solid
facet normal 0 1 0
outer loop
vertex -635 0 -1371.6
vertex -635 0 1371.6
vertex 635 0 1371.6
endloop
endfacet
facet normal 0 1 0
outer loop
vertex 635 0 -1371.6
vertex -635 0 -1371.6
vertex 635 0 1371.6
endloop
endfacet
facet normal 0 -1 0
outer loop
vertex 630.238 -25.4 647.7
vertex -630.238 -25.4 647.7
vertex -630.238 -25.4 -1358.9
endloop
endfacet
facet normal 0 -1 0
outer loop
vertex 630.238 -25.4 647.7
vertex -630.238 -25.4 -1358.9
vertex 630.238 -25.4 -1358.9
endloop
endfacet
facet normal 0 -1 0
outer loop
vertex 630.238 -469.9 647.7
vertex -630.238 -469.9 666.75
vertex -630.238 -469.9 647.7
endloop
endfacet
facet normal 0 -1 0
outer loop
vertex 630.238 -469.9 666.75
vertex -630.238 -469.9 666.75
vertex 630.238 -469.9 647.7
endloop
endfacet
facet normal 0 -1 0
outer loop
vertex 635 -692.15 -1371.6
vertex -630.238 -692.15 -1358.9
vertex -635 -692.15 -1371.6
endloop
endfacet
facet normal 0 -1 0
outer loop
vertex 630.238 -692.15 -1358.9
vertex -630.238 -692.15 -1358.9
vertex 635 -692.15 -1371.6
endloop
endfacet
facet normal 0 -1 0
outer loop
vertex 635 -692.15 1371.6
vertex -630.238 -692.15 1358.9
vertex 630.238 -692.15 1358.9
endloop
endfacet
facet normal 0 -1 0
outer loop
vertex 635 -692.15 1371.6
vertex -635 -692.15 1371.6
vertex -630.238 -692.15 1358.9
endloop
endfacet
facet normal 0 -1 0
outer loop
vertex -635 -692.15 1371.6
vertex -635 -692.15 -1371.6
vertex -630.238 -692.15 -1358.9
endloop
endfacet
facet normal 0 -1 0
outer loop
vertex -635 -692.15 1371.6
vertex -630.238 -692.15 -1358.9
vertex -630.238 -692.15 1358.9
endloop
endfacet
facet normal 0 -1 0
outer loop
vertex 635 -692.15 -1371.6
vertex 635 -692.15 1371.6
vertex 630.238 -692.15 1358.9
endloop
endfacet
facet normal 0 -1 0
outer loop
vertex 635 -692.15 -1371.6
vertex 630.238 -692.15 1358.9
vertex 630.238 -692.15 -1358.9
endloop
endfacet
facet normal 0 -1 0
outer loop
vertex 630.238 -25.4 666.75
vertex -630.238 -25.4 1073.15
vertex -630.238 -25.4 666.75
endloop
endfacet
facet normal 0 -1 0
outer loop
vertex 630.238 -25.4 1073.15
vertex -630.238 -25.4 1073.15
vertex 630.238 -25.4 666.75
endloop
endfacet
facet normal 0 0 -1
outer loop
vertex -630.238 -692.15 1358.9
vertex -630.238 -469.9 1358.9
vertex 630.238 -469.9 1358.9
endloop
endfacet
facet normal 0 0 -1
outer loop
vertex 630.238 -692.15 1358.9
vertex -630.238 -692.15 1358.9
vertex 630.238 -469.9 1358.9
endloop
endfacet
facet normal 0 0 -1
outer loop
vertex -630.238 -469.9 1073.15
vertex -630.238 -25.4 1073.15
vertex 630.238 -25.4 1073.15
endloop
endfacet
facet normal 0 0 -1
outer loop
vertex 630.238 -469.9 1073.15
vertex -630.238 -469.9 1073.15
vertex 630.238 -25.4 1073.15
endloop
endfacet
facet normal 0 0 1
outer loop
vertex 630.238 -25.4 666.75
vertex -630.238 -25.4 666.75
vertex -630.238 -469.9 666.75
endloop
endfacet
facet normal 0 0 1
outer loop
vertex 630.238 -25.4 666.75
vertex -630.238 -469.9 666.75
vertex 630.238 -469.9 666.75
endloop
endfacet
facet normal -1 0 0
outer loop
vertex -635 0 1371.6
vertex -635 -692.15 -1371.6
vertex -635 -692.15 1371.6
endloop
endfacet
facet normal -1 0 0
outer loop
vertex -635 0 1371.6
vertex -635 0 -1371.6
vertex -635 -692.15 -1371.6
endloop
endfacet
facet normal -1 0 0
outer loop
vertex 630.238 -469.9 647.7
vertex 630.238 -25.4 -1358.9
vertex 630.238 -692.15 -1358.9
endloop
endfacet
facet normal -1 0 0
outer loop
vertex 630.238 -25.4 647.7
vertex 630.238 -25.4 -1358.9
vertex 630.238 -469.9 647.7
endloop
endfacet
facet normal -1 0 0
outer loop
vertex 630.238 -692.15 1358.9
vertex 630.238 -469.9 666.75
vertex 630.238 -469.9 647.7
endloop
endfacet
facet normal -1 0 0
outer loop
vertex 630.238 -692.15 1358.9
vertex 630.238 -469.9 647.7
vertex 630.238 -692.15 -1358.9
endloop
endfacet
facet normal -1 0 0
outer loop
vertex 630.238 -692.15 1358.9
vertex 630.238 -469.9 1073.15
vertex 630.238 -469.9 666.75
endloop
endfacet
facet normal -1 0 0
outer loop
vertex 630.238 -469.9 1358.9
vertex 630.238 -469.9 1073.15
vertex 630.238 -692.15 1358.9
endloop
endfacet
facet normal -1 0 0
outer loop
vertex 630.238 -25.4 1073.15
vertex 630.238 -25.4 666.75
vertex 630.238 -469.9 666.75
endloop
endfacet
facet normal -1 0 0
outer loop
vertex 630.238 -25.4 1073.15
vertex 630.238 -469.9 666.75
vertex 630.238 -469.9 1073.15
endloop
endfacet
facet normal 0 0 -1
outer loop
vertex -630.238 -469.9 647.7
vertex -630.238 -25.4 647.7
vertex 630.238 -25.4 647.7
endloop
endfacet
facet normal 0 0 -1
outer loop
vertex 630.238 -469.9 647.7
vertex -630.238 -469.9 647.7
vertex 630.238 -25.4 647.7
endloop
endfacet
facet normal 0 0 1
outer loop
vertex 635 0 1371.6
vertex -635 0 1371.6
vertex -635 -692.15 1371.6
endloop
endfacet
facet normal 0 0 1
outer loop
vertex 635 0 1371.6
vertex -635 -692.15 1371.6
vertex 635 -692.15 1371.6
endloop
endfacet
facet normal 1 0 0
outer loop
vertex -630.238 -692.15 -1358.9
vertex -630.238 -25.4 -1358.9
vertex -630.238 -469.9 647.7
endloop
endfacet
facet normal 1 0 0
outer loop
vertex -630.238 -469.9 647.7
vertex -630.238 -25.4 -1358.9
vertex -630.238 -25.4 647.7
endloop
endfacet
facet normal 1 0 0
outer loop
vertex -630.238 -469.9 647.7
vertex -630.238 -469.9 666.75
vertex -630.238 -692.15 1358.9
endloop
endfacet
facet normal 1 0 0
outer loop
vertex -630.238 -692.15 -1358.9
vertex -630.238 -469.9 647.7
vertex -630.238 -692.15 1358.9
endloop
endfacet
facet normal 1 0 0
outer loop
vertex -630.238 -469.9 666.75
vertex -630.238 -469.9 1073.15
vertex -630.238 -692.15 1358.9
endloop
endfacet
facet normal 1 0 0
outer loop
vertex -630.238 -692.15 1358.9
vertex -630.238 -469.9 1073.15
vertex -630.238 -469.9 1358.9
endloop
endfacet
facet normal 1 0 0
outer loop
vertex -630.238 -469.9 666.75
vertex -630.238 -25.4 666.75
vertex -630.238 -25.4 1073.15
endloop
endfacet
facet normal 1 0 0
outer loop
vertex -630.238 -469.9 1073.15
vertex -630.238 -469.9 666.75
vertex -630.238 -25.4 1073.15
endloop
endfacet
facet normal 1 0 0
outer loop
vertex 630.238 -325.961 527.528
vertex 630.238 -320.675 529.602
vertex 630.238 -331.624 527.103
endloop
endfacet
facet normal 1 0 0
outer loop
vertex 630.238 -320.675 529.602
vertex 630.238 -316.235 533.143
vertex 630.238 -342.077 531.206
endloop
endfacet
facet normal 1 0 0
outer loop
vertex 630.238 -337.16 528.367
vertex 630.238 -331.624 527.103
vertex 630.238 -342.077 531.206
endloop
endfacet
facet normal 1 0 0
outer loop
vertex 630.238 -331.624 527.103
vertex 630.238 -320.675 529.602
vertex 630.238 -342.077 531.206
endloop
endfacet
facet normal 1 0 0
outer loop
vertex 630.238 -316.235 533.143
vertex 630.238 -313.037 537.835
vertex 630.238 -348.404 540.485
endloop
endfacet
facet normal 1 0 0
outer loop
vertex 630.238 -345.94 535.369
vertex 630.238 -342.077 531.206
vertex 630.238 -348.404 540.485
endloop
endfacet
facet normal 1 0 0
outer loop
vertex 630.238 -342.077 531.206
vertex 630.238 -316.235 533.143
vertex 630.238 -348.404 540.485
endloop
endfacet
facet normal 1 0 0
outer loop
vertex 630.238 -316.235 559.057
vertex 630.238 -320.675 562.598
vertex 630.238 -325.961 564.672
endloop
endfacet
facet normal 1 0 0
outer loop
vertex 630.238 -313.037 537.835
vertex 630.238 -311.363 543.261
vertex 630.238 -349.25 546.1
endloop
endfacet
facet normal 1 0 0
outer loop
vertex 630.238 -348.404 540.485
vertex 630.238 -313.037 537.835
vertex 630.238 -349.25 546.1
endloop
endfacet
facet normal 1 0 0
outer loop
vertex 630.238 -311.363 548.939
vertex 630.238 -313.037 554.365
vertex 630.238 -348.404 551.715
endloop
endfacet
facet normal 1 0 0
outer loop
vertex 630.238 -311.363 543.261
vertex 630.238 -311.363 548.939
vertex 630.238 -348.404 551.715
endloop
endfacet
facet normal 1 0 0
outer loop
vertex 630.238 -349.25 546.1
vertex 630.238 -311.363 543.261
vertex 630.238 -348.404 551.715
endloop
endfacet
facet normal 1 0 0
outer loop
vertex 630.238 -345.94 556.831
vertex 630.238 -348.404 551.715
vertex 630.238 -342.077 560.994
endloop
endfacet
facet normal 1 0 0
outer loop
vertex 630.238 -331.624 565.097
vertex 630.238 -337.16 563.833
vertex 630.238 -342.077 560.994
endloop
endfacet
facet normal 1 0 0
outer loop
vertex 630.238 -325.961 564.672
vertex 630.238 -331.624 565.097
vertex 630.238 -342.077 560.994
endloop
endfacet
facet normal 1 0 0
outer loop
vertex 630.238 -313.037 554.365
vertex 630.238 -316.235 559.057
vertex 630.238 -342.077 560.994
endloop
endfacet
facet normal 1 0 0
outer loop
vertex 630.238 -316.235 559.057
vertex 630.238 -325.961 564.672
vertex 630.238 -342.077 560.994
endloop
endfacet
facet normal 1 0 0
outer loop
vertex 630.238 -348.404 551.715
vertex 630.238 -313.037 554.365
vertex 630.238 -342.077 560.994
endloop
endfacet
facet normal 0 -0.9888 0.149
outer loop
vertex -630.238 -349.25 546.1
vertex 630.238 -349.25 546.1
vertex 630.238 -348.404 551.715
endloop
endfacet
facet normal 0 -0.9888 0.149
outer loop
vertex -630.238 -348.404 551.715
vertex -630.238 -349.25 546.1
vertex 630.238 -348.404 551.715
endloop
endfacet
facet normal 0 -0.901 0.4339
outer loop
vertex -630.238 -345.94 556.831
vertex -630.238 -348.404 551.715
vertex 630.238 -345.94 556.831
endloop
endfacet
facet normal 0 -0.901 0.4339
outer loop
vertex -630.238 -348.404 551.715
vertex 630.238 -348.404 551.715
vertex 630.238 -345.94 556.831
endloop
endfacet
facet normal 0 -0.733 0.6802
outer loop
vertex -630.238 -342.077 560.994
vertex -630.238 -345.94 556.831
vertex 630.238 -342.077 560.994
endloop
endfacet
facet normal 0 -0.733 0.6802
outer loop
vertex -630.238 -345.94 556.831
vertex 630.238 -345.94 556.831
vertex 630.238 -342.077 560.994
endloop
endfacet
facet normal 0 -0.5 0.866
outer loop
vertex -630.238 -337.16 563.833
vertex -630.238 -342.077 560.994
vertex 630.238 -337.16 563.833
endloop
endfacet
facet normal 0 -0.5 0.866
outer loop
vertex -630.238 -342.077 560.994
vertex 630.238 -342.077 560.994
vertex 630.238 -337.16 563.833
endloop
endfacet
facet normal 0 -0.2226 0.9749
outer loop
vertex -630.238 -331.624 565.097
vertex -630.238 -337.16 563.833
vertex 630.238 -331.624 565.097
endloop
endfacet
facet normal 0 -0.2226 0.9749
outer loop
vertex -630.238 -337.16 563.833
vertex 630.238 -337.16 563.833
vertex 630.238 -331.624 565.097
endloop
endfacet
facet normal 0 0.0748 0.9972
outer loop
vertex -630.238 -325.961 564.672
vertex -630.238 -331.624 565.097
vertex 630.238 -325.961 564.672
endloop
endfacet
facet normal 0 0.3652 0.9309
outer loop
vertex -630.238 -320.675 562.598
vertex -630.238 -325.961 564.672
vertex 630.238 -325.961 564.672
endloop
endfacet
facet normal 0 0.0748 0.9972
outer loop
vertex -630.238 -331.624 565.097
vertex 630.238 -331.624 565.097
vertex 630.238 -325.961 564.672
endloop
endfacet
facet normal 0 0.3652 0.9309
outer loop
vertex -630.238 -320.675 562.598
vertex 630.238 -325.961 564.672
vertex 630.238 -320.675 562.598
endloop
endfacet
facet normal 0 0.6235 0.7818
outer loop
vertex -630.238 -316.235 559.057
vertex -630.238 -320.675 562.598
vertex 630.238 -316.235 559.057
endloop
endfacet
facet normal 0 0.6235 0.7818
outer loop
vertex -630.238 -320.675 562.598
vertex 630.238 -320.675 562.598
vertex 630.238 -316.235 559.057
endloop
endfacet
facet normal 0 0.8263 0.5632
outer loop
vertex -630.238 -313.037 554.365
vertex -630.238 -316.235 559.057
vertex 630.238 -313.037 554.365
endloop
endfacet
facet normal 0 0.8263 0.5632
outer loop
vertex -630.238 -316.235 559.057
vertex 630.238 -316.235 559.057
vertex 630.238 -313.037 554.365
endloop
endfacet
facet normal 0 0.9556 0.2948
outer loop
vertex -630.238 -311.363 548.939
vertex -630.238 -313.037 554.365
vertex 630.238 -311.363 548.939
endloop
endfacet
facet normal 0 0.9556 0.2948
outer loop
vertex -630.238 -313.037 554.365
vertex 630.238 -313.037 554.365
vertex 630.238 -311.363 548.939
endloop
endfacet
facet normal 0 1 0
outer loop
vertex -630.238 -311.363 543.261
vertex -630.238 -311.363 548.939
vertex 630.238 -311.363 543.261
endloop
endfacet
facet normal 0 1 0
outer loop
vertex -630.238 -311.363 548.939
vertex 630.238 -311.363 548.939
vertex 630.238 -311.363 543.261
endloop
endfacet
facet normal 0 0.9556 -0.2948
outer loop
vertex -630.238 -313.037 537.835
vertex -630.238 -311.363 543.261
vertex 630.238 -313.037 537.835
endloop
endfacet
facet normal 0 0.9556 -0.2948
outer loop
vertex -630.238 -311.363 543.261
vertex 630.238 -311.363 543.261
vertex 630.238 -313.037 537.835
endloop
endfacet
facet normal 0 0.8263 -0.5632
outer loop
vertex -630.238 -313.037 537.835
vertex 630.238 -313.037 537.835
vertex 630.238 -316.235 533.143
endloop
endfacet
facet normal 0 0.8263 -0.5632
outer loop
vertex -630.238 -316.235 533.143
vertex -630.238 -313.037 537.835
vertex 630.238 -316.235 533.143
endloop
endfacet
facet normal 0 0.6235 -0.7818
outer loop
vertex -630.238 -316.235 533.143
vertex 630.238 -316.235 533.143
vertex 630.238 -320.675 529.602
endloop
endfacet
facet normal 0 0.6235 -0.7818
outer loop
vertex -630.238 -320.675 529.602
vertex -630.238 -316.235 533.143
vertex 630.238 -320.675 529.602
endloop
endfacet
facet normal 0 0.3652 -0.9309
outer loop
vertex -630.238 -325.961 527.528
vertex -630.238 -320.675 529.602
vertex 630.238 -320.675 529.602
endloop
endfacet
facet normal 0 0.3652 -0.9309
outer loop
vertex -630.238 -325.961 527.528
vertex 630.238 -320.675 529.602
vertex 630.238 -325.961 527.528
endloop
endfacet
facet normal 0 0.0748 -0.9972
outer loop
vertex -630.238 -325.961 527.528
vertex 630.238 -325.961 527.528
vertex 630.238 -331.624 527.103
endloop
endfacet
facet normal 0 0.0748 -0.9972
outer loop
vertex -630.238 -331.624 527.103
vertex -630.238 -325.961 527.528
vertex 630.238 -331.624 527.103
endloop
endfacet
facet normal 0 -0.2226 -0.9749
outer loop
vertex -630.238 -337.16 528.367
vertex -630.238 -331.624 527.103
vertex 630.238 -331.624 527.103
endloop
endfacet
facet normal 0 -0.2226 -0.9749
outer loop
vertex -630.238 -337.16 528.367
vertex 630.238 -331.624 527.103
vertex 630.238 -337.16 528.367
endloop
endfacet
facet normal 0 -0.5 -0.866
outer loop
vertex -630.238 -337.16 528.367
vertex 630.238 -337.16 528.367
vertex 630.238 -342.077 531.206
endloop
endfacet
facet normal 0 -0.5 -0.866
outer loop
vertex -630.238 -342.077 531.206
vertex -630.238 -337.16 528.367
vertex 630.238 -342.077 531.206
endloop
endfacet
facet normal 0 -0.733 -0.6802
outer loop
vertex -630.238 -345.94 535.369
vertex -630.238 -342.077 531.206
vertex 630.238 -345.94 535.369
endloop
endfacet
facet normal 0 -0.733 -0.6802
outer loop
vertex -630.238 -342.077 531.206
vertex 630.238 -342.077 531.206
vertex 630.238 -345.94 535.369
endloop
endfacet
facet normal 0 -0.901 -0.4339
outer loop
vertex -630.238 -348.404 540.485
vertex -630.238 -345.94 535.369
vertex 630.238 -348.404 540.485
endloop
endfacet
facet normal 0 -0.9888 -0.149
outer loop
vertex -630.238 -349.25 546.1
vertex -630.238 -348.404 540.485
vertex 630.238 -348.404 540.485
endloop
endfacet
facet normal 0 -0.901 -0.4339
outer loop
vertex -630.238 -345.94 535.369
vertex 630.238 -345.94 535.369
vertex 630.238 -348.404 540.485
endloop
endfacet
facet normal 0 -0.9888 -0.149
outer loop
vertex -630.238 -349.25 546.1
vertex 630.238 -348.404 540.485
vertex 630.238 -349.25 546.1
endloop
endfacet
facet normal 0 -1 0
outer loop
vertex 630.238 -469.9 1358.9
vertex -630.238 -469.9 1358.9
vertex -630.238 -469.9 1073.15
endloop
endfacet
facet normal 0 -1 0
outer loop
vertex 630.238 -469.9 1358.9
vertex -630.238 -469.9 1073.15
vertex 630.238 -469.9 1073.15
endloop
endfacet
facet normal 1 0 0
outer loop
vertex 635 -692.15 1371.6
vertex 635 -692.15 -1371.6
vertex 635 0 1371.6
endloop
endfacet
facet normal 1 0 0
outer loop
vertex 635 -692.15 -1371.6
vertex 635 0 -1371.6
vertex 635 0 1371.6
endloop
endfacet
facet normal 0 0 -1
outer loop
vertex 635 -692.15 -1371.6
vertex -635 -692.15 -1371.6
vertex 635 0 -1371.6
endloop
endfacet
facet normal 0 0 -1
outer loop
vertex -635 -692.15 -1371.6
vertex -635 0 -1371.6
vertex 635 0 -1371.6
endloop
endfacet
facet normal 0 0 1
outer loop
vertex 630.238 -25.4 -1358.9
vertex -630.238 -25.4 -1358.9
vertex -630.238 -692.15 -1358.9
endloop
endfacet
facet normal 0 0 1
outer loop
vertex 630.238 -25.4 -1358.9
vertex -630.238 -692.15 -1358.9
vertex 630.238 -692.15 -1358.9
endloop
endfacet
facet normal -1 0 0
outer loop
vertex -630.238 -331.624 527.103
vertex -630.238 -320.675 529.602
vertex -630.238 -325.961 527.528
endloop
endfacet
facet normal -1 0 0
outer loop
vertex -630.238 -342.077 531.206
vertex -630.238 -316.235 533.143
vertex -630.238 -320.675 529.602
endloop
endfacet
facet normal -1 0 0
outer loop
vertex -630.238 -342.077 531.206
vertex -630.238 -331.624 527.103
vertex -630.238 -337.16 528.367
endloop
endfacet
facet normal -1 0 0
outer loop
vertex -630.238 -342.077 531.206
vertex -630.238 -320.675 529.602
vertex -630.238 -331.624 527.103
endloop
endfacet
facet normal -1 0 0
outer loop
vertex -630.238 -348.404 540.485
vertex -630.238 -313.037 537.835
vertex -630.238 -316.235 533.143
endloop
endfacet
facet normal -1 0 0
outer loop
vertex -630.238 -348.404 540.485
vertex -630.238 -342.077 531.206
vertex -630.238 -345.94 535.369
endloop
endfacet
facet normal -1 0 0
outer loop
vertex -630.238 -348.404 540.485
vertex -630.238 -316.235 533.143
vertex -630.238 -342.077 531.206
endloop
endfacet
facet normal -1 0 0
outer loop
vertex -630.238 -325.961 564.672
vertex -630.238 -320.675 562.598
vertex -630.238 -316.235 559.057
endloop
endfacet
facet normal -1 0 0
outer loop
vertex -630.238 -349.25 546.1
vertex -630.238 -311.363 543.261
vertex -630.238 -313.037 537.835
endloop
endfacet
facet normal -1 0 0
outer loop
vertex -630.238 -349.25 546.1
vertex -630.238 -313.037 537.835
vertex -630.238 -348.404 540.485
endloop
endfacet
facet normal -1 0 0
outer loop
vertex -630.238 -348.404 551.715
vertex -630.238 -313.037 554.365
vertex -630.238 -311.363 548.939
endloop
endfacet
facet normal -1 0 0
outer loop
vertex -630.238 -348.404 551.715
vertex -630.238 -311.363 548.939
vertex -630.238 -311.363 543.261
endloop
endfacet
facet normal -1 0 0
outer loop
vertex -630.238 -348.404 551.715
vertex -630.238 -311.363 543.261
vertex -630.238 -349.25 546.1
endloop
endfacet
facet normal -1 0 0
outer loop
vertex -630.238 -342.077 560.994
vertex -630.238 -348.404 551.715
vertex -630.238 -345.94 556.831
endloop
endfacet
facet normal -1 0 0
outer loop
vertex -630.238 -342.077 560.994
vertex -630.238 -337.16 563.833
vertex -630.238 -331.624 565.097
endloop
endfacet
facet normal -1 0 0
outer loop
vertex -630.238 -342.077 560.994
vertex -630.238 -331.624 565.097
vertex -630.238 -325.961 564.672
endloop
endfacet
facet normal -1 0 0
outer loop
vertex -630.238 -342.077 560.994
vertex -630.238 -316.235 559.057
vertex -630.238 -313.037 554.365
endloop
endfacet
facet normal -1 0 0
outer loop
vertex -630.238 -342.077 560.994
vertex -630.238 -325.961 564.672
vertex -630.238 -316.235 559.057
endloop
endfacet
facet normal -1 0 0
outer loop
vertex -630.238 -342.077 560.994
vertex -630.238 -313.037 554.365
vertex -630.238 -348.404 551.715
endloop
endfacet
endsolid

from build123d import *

# Parameters (mm, degrees)
F0_W     = 1270
F0_H     = 2743.2
F1_DEPTH = 25.4
F2_W     = 1270
F2_H     = 2743.2
F2_W_2   = 1260.475
F2_H_2   = 2717.8
F3_DEPTH = 666.75
F4_W     = 1260.475
F4_H     = 285.75
F4_H_2   = 19.05
F5_DEPTH = 444.5
F6_R     = 19.05
F7_DEPTH = 1260.475


with BuildPart() as f1:
    # F0 (on Front) → F1 (new body)
    with BuildSketch(Plane.XZ):
        Rectangle(F0_W, F0_H)
    extrude(amount=F1_DEPTH)

    # F2 (on face) → F3 (join)
    with BuildSketch(Plane.XZ.offset(25.4)):
        Rectangle(F2_W, F2_H)
        Rectangle(F2_W_2, F2_H_2, mode=Mode.SUBTRACT)
    extrude(amount=F3_DEPTH)

    # F4 (on face) → F5 (join)
    with BuildSketch(Plane.XZ.offset(25.4)):
        with Locations((0, 1216.025)):
            Rectangle(F4_W, F4_H)
        with Locations((0, 657.225)):
            Rectangle(F4_W, F4_H_2)
    extrude(amount=F5_DEPTH)


with BuildPart() as f7:
    # F6 (on face) → F7 (new body, through all)
    with BuildSketch(Plane(origin=(630.2375, 0, 0), x_dir=(0, -1, 0), z_dir=(-1, 0, 0))):
        with Locations((330.2, 546.1)):
            Circle(F6_R)
    extrude(amount=F7_DEPTH)


solid = Compound([f1.part, f7.part])
